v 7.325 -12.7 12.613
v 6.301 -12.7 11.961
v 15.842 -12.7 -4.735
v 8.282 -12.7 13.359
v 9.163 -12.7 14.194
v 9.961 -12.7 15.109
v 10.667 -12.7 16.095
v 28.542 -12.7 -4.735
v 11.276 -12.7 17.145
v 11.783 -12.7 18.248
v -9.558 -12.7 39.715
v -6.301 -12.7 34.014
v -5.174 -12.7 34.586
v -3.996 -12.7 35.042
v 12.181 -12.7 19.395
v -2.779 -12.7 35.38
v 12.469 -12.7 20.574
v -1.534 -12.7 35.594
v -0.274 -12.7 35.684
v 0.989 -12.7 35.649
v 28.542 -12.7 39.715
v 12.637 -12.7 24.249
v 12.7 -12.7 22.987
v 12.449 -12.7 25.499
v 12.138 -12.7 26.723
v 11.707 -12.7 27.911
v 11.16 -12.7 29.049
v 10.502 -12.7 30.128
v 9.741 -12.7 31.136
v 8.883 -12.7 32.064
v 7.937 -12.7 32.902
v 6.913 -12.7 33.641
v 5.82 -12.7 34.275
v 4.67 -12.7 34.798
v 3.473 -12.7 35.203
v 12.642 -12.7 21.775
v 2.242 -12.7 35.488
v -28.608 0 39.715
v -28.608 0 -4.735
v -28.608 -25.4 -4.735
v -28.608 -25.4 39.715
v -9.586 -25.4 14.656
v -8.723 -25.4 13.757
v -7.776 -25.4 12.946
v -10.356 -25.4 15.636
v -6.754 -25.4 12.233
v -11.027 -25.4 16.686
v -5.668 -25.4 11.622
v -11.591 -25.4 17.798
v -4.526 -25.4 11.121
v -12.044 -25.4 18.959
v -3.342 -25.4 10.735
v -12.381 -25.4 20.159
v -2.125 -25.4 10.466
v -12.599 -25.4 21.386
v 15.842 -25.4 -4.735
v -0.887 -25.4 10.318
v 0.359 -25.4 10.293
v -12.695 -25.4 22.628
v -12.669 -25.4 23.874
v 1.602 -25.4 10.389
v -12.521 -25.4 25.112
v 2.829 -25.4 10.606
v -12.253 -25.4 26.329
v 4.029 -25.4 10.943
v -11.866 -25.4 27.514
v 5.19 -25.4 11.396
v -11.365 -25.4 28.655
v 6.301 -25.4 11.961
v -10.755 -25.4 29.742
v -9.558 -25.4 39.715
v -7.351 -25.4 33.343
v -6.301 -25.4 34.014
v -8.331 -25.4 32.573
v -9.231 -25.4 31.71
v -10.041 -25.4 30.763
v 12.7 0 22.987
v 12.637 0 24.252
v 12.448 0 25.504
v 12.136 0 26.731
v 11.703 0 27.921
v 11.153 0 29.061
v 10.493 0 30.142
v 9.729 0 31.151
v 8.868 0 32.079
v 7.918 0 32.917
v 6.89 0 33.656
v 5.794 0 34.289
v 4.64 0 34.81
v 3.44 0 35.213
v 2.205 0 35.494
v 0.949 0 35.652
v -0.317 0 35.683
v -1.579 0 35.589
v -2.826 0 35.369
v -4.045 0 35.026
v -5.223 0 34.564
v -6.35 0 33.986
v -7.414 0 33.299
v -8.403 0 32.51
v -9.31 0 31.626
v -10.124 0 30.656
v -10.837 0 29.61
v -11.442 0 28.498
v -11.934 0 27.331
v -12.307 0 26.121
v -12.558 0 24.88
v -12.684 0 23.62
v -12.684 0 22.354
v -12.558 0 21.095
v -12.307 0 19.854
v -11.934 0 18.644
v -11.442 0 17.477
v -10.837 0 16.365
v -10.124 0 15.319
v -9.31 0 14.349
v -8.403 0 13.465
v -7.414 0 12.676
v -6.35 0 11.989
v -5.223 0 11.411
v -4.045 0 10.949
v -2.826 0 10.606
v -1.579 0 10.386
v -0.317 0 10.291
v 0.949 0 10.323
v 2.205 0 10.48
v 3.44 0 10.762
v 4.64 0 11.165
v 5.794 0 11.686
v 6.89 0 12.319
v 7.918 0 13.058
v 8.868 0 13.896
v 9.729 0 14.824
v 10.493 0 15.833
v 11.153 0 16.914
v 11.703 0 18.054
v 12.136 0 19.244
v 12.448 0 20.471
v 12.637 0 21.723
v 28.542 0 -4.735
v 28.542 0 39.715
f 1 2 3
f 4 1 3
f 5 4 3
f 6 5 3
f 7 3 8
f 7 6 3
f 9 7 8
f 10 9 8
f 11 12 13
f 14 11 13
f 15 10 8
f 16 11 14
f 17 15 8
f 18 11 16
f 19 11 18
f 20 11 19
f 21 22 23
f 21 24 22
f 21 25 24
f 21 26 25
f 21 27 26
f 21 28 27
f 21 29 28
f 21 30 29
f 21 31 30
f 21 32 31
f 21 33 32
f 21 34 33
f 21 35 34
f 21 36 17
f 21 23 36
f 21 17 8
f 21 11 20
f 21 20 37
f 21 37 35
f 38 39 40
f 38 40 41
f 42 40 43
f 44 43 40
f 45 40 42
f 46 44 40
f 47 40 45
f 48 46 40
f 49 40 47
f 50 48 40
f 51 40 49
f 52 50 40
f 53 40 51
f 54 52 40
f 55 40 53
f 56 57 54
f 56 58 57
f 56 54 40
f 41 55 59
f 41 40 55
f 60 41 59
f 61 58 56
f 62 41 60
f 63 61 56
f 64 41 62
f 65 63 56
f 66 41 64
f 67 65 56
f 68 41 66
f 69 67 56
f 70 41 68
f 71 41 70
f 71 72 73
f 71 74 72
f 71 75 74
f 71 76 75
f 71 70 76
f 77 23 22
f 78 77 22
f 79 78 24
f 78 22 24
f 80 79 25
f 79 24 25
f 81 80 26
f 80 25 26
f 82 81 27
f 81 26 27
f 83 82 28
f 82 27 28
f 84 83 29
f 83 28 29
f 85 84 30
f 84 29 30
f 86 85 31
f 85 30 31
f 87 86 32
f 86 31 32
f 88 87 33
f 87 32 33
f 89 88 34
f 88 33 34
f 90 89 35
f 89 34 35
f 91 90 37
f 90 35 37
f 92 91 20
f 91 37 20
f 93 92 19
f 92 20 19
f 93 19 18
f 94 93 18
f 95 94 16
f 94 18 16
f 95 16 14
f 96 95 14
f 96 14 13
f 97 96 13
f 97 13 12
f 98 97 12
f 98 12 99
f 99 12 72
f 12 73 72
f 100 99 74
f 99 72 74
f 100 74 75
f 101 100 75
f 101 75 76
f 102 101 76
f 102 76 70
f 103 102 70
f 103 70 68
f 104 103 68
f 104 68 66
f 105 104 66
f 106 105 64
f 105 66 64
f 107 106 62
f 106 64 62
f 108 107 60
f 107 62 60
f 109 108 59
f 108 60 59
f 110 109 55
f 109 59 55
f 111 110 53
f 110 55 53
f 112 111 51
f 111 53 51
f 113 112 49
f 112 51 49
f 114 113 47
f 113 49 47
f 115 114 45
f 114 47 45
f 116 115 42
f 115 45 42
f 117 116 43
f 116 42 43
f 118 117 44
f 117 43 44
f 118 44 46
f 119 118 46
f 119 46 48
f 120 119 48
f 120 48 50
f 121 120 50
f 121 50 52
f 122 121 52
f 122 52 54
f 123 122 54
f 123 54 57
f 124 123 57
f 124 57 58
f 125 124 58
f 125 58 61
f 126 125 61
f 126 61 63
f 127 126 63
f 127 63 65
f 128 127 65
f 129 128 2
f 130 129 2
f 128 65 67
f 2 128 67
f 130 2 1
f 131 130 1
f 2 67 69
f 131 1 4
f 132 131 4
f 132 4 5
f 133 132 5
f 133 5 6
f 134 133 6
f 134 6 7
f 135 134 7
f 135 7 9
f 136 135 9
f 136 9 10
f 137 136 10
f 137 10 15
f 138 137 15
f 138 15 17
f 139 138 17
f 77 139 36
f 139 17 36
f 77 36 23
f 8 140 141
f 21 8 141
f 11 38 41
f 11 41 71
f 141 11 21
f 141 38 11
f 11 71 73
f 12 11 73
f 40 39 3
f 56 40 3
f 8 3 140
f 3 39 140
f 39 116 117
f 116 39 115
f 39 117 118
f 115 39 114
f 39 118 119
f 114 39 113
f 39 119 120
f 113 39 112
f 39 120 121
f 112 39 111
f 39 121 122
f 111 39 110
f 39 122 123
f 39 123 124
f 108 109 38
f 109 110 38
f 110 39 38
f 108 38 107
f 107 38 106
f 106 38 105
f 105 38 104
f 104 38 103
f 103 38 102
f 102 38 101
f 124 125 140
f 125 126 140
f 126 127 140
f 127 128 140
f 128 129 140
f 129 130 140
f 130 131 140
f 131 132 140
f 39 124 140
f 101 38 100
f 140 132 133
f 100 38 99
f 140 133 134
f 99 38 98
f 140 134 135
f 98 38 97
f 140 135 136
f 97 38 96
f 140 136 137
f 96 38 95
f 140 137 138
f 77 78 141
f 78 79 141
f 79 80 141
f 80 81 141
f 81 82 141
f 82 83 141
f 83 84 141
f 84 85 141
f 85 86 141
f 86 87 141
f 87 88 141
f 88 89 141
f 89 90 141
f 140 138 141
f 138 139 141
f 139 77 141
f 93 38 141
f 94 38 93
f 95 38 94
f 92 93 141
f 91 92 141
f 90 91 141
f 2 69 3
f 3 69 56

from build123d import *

# Parameters (mm, degrees)
F0_W     = 57.15
F0_H     = 44.45
F1_DEPTH = 25.4
F3_DEPTH = 12.7
F4_R     = 12.7
F5_DEPTH = 27940


with BuildPart() as f1:
    # F0 (on Front) → F1 (new body)
    with BuildSketch(Plane.XZ):
        with Locations((-0.033397, 17.489623)):
            Rectangle(F0_W, F0_H)
    extrude(amount=F1_DEPTH)

    # F2 (on face) → F3 (cut)
    with BuildSketch(Plane.XZ.offset(25.4)):
        Polygon((28.541603, 39.714623), (-9.558397, 39.714623), (15.841603, -4.735377), (28.541603, -4.735377), align=None)
    extrude(amount=-F3_DEPTH, mode=Mode.SUBTRACT)

    # F4 (on face) → F5 (cut)
    with BuildSketch(Plane.XZ.offset(25.4)):
        with Locations((0, 22.987428)):
            Circle(F4_R)
    extrude(amount=-F5_DEPTH, mode=Mode.SUBTRACT)


solid = f1.part
